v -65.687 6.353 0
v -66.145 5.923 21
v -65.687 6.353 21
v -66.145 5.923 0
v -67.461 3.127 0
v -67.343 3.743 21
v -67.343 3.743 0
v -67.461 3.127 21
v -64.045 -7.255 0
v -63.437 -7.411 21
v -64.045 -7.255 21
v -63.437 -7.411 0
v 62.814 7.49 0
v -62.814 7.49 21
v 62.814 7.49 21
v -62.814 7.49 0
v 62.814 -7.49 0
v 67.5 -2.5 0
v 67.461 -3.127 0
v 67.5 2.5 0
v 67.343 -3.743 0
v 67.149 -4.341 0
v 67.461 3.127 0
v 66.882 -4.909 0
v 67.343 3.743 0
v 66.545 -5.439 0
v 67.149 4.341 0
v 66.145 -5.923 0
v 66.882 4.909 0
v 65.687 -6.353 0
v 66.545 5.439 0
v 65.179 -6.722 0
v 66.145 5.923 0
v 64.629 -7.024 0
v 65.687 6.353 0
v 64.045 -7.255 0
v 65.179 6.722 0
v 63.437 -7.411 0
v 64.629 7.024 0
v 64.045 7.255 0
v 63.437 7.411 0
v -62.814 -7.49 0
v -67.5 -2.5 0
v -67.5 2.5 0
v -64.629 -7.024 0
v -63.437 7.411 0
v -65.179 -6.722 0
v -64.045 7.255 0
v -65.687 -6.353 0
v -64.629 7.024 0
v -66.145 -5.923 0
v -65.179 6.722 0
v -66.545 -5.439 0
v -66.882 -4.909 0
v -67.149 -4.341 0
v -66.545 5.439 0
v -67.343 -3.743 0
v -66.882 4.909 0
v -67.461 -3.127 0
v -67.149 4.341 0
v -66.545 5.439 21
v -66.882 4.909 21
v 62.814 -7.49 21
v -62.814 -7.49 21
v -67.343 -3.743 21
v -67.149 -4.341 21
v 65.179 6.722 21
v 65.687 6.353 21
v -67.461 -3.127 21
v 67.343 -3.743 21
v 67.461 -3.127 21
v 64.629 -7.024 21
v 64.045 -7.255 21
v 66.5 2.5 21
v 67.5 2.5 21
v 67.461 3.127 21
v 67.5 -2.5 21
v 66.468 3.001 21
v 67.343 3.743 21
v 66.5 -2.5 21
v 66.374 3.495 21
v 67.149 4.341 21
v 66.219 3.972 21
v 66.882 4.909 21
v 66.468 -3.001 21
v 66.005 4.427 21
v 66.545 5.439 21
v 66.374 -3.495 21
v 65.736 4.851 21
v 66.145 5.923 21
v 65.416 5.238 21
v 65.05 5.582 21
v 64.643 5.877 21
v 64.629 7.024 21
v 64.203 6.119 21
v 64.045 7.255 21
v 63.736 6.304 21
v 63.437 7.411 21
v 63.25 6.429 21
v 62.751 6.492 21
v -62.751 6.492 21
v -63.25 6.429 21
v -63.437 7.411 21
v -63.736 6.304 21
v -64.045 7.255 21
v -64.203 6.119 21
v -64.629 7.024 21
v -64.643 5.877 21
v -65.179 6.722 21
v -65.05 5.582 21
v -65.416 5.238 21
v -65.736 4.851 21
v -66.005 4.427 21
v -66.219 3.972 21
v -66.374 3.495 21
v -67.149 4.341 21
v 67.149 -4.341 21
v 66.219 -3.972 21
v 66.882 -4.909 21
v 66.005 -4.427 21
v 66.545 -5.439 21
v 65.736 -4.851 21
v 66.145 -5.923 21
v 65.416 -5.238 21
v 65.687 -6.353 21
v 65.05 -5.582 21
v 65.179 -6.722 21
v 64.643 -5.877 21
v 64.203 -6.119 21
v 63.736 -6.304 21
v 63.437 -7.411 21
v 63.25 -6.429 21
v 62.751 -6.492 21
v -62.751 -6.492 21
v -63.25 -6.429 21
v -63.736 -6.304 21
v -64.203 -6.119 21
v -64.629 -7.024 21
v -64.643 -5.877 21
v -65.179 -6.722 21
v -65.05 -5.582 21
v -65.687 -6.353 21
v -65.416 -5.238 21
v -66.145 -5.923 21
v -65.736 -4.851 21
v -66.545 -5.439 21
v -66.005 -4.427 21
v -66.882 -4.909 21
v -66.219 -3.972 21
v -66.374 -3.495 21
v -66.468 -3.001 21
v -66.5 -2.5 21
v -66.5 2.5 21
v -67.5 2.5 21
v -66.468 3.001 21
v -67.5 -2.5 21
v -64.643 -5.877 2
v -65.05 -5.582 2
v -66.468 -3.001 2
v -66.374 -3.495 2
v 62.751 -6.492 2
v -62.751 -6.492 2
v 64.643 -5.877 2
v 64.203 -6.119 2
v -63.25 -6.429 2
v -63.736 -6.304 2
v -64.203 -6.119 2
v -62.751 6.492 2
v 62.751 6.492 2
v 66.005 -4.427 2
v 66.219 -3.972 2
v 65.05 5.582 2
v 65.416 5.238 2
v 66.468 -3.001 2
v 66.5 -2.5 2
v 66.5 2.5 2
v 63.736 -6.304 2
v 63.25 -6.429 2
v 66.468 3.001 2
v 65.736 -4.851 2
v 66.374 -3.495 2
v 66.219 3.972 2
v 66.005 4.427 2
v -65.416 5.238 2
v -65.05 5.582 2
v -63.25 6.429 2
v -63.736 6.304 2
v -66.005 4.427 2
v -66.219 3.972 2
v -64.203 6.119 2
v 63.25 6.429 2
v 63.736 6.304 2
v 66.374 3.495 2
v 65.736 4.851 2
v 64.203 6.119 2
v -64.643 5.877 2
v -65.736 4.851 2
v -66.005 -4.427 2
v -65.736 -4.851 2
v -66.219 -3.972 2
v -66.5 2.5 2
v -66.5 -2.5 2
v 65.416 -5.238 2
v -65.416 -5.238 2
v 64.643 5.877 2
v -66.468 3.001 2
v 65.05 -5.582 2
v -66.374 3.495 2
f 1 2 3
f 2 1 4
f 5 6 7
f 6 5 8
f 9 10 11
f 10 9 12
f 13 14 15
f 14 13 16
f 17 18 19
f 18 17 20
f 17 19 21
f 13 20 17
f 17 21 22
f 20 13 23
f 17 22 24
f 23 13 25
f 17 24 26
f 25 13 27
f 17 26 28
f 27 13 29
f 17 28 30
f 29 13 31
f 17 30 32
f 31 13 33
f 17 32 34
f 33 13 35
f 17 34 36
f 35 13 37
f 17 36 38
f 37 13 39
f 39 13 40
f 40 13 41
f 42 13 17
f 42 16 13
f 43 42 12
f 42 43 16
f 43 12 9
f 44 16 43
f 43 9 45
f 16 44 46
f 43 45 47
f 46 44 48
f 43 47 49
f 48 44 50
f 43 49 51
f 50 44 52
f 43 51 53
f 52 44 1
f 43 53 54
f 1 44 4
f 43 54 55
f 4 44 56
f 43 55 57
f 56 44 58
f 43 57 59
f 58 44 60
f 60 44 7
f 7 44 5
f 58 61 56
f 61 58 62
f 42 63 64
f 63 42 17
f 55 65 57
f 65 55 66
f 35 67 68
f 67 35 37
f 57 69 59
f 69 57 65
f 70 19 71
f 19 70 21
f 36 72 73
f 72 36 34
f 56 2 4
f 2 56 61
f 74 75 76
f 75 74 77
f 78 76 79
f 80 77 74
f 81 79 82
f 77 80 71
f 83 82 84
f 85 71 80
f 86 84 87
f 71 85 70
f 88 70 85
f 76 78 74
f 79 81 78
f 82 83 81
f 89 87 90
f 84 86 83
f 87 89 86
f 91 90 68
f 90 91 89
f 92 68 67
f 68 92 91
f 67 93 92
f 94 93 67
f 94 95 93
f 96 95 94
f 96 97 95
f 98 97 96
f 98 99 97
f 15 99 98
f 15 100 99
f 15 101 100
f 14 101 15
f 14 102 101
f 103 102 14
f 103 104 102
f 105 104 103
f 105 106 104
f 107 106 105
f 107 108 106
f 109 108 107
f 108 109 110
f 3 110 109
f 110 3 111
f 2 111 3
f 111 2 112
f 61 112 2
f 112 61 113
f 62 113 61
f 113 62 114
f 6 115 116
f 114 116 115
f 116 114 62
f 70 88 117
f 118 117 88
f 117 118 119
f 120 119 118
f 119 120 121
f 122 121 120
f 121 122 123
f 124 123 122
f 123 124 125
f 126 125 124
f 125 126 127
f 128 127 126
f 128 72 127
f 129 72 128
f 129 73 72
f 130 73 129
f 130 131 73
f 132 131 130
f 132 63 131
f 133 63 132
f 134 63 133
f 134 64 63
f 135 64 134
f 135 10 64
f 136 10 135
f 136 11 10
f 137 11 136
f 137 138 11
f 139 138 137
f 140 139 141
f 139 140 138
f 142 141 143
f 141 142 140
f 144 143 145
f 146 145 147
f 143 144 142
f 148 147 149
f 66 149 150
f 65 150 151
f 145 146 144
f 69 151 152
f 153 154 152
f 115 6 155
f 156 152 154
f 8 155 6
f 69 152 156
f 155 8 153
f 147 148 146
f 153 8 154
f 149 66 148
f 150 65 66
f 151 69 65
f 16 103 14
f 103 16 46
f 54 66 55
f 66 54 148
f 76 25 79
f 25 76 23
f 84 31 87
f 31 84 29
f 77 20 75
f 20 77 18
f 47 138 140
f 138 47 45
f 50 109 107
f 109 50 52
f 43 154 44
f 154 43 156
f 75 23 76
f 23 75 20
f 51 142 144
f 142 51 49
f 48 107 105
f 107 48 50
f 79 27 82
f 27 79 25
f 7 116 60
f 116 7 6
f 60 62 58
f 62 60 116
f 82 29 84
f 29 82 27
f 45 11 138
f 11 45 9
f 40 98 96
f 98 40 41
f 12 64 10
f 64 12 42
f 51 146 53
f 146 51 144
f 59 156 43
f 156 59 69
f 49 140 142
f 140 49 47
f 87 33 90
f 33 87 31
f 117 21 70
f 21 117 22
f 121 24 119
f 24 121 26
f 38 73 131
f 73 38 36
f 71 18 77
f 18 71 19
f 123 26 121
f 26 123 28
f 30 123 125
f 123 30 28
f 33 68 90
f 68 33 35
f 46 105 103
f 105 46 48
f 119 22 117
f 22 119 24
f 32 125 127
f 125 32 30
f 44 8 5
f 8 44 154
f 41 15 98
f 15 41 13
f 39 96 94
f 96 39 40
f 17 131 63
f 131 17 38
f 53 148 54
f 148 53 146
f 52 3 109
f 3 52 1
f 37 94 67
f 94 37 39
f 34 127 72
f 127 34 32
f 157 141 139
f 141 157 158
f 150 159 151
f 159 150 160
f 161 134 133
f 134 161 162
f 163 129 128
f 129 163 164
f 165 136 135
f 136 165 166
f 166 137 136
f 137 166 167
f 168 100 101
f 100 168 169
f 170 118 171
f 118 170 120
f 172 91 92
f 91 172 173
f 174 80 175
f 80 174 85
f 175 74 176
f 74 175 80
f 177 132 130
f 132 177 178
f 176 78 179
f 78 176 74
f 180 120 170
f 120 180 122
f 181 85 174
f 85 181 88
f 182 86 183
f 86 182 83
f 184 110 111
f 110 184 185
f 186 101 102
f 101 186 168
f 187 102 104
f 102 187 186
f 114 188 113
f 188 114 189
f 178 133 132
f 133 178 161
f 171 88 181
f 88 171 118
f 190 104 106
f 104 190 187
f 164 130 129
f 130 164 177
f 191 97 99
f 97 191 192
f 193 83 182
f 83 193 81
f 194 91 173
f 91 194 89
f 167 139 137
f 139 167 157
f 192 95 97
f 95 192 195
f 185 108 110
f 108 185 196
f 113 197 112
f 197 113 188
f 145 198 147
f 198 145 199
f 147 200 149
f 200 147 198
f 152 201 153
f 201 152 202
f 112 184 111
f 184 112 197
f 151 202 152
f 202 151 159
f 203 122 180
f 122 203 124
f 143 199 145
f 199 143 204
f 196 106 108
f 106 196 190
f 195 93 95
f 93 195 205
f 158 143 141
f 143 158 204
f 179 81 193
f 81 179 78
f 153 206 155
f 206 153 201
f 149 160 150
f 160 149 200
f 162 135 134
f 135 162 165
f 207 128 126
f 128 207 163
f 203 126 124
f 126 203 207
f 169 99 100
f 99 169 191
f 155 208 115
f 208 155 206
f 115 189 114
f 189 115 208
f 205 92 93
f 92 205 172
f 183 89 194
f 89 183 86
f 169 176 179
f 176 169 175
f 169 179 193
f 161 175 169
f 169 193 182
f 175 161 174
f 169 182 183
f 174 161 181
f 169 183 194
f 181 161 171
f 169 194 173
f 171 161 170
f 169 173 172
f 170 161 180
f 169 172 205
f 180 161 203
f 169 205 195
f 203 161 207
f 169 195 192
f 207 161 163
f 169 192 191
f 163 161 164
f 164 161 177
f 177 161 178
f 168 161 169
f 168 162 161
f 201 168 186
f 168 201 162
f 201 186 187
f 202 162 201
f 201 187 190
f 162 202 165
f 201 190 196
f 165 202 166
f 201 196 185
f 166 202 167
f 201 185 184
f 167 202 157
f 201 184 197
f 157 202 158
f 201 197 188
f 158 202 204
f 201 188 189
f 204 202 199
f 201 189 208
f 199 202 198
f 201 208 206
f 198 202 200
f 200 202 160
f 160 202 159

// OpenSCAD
$fn = 50;


difference() {
	union() {
		hull() {
			translate(v = [-62.5000000000, 2.5000000000, 0]) {
				cylinder(h = 21, r = 5);
			}
			translate(v = [62.5000000000, 2.5000000000, 0]) {
				cylinder(h = 21, r = 5);
			}
			translate(v = [-62.5000000000, -2.5000000000, 0]) {
				cylinder(h = 21, r = 5);
			}
			translate(v = [62.5000000000, -2.5000000000, 0]) {
				cylinder(h = 21, r = 5);
			}
		}
	}
	union() {
		translate(v = [0, 0, 2]) {
			hull() {
				translate(v = [-62.5000000000, 2.5000000000, 0]) {
					cylinder(h = 19, r = 4);
				}
				translate(v = [62.5000000000, 2.5000000000, 0]) {
					cylinder(h = 19, r = 4);
				}
				translate(v = [-62.5000000000, -2.5000000000, 0]) {
					cylinder(h = 19, r = 4);
				}
				translate(v = [62.5000000000, -2.5000000000, 0]) {
					cylinder(h = 19, r = 4);
				}
			}
		}
	}
}
